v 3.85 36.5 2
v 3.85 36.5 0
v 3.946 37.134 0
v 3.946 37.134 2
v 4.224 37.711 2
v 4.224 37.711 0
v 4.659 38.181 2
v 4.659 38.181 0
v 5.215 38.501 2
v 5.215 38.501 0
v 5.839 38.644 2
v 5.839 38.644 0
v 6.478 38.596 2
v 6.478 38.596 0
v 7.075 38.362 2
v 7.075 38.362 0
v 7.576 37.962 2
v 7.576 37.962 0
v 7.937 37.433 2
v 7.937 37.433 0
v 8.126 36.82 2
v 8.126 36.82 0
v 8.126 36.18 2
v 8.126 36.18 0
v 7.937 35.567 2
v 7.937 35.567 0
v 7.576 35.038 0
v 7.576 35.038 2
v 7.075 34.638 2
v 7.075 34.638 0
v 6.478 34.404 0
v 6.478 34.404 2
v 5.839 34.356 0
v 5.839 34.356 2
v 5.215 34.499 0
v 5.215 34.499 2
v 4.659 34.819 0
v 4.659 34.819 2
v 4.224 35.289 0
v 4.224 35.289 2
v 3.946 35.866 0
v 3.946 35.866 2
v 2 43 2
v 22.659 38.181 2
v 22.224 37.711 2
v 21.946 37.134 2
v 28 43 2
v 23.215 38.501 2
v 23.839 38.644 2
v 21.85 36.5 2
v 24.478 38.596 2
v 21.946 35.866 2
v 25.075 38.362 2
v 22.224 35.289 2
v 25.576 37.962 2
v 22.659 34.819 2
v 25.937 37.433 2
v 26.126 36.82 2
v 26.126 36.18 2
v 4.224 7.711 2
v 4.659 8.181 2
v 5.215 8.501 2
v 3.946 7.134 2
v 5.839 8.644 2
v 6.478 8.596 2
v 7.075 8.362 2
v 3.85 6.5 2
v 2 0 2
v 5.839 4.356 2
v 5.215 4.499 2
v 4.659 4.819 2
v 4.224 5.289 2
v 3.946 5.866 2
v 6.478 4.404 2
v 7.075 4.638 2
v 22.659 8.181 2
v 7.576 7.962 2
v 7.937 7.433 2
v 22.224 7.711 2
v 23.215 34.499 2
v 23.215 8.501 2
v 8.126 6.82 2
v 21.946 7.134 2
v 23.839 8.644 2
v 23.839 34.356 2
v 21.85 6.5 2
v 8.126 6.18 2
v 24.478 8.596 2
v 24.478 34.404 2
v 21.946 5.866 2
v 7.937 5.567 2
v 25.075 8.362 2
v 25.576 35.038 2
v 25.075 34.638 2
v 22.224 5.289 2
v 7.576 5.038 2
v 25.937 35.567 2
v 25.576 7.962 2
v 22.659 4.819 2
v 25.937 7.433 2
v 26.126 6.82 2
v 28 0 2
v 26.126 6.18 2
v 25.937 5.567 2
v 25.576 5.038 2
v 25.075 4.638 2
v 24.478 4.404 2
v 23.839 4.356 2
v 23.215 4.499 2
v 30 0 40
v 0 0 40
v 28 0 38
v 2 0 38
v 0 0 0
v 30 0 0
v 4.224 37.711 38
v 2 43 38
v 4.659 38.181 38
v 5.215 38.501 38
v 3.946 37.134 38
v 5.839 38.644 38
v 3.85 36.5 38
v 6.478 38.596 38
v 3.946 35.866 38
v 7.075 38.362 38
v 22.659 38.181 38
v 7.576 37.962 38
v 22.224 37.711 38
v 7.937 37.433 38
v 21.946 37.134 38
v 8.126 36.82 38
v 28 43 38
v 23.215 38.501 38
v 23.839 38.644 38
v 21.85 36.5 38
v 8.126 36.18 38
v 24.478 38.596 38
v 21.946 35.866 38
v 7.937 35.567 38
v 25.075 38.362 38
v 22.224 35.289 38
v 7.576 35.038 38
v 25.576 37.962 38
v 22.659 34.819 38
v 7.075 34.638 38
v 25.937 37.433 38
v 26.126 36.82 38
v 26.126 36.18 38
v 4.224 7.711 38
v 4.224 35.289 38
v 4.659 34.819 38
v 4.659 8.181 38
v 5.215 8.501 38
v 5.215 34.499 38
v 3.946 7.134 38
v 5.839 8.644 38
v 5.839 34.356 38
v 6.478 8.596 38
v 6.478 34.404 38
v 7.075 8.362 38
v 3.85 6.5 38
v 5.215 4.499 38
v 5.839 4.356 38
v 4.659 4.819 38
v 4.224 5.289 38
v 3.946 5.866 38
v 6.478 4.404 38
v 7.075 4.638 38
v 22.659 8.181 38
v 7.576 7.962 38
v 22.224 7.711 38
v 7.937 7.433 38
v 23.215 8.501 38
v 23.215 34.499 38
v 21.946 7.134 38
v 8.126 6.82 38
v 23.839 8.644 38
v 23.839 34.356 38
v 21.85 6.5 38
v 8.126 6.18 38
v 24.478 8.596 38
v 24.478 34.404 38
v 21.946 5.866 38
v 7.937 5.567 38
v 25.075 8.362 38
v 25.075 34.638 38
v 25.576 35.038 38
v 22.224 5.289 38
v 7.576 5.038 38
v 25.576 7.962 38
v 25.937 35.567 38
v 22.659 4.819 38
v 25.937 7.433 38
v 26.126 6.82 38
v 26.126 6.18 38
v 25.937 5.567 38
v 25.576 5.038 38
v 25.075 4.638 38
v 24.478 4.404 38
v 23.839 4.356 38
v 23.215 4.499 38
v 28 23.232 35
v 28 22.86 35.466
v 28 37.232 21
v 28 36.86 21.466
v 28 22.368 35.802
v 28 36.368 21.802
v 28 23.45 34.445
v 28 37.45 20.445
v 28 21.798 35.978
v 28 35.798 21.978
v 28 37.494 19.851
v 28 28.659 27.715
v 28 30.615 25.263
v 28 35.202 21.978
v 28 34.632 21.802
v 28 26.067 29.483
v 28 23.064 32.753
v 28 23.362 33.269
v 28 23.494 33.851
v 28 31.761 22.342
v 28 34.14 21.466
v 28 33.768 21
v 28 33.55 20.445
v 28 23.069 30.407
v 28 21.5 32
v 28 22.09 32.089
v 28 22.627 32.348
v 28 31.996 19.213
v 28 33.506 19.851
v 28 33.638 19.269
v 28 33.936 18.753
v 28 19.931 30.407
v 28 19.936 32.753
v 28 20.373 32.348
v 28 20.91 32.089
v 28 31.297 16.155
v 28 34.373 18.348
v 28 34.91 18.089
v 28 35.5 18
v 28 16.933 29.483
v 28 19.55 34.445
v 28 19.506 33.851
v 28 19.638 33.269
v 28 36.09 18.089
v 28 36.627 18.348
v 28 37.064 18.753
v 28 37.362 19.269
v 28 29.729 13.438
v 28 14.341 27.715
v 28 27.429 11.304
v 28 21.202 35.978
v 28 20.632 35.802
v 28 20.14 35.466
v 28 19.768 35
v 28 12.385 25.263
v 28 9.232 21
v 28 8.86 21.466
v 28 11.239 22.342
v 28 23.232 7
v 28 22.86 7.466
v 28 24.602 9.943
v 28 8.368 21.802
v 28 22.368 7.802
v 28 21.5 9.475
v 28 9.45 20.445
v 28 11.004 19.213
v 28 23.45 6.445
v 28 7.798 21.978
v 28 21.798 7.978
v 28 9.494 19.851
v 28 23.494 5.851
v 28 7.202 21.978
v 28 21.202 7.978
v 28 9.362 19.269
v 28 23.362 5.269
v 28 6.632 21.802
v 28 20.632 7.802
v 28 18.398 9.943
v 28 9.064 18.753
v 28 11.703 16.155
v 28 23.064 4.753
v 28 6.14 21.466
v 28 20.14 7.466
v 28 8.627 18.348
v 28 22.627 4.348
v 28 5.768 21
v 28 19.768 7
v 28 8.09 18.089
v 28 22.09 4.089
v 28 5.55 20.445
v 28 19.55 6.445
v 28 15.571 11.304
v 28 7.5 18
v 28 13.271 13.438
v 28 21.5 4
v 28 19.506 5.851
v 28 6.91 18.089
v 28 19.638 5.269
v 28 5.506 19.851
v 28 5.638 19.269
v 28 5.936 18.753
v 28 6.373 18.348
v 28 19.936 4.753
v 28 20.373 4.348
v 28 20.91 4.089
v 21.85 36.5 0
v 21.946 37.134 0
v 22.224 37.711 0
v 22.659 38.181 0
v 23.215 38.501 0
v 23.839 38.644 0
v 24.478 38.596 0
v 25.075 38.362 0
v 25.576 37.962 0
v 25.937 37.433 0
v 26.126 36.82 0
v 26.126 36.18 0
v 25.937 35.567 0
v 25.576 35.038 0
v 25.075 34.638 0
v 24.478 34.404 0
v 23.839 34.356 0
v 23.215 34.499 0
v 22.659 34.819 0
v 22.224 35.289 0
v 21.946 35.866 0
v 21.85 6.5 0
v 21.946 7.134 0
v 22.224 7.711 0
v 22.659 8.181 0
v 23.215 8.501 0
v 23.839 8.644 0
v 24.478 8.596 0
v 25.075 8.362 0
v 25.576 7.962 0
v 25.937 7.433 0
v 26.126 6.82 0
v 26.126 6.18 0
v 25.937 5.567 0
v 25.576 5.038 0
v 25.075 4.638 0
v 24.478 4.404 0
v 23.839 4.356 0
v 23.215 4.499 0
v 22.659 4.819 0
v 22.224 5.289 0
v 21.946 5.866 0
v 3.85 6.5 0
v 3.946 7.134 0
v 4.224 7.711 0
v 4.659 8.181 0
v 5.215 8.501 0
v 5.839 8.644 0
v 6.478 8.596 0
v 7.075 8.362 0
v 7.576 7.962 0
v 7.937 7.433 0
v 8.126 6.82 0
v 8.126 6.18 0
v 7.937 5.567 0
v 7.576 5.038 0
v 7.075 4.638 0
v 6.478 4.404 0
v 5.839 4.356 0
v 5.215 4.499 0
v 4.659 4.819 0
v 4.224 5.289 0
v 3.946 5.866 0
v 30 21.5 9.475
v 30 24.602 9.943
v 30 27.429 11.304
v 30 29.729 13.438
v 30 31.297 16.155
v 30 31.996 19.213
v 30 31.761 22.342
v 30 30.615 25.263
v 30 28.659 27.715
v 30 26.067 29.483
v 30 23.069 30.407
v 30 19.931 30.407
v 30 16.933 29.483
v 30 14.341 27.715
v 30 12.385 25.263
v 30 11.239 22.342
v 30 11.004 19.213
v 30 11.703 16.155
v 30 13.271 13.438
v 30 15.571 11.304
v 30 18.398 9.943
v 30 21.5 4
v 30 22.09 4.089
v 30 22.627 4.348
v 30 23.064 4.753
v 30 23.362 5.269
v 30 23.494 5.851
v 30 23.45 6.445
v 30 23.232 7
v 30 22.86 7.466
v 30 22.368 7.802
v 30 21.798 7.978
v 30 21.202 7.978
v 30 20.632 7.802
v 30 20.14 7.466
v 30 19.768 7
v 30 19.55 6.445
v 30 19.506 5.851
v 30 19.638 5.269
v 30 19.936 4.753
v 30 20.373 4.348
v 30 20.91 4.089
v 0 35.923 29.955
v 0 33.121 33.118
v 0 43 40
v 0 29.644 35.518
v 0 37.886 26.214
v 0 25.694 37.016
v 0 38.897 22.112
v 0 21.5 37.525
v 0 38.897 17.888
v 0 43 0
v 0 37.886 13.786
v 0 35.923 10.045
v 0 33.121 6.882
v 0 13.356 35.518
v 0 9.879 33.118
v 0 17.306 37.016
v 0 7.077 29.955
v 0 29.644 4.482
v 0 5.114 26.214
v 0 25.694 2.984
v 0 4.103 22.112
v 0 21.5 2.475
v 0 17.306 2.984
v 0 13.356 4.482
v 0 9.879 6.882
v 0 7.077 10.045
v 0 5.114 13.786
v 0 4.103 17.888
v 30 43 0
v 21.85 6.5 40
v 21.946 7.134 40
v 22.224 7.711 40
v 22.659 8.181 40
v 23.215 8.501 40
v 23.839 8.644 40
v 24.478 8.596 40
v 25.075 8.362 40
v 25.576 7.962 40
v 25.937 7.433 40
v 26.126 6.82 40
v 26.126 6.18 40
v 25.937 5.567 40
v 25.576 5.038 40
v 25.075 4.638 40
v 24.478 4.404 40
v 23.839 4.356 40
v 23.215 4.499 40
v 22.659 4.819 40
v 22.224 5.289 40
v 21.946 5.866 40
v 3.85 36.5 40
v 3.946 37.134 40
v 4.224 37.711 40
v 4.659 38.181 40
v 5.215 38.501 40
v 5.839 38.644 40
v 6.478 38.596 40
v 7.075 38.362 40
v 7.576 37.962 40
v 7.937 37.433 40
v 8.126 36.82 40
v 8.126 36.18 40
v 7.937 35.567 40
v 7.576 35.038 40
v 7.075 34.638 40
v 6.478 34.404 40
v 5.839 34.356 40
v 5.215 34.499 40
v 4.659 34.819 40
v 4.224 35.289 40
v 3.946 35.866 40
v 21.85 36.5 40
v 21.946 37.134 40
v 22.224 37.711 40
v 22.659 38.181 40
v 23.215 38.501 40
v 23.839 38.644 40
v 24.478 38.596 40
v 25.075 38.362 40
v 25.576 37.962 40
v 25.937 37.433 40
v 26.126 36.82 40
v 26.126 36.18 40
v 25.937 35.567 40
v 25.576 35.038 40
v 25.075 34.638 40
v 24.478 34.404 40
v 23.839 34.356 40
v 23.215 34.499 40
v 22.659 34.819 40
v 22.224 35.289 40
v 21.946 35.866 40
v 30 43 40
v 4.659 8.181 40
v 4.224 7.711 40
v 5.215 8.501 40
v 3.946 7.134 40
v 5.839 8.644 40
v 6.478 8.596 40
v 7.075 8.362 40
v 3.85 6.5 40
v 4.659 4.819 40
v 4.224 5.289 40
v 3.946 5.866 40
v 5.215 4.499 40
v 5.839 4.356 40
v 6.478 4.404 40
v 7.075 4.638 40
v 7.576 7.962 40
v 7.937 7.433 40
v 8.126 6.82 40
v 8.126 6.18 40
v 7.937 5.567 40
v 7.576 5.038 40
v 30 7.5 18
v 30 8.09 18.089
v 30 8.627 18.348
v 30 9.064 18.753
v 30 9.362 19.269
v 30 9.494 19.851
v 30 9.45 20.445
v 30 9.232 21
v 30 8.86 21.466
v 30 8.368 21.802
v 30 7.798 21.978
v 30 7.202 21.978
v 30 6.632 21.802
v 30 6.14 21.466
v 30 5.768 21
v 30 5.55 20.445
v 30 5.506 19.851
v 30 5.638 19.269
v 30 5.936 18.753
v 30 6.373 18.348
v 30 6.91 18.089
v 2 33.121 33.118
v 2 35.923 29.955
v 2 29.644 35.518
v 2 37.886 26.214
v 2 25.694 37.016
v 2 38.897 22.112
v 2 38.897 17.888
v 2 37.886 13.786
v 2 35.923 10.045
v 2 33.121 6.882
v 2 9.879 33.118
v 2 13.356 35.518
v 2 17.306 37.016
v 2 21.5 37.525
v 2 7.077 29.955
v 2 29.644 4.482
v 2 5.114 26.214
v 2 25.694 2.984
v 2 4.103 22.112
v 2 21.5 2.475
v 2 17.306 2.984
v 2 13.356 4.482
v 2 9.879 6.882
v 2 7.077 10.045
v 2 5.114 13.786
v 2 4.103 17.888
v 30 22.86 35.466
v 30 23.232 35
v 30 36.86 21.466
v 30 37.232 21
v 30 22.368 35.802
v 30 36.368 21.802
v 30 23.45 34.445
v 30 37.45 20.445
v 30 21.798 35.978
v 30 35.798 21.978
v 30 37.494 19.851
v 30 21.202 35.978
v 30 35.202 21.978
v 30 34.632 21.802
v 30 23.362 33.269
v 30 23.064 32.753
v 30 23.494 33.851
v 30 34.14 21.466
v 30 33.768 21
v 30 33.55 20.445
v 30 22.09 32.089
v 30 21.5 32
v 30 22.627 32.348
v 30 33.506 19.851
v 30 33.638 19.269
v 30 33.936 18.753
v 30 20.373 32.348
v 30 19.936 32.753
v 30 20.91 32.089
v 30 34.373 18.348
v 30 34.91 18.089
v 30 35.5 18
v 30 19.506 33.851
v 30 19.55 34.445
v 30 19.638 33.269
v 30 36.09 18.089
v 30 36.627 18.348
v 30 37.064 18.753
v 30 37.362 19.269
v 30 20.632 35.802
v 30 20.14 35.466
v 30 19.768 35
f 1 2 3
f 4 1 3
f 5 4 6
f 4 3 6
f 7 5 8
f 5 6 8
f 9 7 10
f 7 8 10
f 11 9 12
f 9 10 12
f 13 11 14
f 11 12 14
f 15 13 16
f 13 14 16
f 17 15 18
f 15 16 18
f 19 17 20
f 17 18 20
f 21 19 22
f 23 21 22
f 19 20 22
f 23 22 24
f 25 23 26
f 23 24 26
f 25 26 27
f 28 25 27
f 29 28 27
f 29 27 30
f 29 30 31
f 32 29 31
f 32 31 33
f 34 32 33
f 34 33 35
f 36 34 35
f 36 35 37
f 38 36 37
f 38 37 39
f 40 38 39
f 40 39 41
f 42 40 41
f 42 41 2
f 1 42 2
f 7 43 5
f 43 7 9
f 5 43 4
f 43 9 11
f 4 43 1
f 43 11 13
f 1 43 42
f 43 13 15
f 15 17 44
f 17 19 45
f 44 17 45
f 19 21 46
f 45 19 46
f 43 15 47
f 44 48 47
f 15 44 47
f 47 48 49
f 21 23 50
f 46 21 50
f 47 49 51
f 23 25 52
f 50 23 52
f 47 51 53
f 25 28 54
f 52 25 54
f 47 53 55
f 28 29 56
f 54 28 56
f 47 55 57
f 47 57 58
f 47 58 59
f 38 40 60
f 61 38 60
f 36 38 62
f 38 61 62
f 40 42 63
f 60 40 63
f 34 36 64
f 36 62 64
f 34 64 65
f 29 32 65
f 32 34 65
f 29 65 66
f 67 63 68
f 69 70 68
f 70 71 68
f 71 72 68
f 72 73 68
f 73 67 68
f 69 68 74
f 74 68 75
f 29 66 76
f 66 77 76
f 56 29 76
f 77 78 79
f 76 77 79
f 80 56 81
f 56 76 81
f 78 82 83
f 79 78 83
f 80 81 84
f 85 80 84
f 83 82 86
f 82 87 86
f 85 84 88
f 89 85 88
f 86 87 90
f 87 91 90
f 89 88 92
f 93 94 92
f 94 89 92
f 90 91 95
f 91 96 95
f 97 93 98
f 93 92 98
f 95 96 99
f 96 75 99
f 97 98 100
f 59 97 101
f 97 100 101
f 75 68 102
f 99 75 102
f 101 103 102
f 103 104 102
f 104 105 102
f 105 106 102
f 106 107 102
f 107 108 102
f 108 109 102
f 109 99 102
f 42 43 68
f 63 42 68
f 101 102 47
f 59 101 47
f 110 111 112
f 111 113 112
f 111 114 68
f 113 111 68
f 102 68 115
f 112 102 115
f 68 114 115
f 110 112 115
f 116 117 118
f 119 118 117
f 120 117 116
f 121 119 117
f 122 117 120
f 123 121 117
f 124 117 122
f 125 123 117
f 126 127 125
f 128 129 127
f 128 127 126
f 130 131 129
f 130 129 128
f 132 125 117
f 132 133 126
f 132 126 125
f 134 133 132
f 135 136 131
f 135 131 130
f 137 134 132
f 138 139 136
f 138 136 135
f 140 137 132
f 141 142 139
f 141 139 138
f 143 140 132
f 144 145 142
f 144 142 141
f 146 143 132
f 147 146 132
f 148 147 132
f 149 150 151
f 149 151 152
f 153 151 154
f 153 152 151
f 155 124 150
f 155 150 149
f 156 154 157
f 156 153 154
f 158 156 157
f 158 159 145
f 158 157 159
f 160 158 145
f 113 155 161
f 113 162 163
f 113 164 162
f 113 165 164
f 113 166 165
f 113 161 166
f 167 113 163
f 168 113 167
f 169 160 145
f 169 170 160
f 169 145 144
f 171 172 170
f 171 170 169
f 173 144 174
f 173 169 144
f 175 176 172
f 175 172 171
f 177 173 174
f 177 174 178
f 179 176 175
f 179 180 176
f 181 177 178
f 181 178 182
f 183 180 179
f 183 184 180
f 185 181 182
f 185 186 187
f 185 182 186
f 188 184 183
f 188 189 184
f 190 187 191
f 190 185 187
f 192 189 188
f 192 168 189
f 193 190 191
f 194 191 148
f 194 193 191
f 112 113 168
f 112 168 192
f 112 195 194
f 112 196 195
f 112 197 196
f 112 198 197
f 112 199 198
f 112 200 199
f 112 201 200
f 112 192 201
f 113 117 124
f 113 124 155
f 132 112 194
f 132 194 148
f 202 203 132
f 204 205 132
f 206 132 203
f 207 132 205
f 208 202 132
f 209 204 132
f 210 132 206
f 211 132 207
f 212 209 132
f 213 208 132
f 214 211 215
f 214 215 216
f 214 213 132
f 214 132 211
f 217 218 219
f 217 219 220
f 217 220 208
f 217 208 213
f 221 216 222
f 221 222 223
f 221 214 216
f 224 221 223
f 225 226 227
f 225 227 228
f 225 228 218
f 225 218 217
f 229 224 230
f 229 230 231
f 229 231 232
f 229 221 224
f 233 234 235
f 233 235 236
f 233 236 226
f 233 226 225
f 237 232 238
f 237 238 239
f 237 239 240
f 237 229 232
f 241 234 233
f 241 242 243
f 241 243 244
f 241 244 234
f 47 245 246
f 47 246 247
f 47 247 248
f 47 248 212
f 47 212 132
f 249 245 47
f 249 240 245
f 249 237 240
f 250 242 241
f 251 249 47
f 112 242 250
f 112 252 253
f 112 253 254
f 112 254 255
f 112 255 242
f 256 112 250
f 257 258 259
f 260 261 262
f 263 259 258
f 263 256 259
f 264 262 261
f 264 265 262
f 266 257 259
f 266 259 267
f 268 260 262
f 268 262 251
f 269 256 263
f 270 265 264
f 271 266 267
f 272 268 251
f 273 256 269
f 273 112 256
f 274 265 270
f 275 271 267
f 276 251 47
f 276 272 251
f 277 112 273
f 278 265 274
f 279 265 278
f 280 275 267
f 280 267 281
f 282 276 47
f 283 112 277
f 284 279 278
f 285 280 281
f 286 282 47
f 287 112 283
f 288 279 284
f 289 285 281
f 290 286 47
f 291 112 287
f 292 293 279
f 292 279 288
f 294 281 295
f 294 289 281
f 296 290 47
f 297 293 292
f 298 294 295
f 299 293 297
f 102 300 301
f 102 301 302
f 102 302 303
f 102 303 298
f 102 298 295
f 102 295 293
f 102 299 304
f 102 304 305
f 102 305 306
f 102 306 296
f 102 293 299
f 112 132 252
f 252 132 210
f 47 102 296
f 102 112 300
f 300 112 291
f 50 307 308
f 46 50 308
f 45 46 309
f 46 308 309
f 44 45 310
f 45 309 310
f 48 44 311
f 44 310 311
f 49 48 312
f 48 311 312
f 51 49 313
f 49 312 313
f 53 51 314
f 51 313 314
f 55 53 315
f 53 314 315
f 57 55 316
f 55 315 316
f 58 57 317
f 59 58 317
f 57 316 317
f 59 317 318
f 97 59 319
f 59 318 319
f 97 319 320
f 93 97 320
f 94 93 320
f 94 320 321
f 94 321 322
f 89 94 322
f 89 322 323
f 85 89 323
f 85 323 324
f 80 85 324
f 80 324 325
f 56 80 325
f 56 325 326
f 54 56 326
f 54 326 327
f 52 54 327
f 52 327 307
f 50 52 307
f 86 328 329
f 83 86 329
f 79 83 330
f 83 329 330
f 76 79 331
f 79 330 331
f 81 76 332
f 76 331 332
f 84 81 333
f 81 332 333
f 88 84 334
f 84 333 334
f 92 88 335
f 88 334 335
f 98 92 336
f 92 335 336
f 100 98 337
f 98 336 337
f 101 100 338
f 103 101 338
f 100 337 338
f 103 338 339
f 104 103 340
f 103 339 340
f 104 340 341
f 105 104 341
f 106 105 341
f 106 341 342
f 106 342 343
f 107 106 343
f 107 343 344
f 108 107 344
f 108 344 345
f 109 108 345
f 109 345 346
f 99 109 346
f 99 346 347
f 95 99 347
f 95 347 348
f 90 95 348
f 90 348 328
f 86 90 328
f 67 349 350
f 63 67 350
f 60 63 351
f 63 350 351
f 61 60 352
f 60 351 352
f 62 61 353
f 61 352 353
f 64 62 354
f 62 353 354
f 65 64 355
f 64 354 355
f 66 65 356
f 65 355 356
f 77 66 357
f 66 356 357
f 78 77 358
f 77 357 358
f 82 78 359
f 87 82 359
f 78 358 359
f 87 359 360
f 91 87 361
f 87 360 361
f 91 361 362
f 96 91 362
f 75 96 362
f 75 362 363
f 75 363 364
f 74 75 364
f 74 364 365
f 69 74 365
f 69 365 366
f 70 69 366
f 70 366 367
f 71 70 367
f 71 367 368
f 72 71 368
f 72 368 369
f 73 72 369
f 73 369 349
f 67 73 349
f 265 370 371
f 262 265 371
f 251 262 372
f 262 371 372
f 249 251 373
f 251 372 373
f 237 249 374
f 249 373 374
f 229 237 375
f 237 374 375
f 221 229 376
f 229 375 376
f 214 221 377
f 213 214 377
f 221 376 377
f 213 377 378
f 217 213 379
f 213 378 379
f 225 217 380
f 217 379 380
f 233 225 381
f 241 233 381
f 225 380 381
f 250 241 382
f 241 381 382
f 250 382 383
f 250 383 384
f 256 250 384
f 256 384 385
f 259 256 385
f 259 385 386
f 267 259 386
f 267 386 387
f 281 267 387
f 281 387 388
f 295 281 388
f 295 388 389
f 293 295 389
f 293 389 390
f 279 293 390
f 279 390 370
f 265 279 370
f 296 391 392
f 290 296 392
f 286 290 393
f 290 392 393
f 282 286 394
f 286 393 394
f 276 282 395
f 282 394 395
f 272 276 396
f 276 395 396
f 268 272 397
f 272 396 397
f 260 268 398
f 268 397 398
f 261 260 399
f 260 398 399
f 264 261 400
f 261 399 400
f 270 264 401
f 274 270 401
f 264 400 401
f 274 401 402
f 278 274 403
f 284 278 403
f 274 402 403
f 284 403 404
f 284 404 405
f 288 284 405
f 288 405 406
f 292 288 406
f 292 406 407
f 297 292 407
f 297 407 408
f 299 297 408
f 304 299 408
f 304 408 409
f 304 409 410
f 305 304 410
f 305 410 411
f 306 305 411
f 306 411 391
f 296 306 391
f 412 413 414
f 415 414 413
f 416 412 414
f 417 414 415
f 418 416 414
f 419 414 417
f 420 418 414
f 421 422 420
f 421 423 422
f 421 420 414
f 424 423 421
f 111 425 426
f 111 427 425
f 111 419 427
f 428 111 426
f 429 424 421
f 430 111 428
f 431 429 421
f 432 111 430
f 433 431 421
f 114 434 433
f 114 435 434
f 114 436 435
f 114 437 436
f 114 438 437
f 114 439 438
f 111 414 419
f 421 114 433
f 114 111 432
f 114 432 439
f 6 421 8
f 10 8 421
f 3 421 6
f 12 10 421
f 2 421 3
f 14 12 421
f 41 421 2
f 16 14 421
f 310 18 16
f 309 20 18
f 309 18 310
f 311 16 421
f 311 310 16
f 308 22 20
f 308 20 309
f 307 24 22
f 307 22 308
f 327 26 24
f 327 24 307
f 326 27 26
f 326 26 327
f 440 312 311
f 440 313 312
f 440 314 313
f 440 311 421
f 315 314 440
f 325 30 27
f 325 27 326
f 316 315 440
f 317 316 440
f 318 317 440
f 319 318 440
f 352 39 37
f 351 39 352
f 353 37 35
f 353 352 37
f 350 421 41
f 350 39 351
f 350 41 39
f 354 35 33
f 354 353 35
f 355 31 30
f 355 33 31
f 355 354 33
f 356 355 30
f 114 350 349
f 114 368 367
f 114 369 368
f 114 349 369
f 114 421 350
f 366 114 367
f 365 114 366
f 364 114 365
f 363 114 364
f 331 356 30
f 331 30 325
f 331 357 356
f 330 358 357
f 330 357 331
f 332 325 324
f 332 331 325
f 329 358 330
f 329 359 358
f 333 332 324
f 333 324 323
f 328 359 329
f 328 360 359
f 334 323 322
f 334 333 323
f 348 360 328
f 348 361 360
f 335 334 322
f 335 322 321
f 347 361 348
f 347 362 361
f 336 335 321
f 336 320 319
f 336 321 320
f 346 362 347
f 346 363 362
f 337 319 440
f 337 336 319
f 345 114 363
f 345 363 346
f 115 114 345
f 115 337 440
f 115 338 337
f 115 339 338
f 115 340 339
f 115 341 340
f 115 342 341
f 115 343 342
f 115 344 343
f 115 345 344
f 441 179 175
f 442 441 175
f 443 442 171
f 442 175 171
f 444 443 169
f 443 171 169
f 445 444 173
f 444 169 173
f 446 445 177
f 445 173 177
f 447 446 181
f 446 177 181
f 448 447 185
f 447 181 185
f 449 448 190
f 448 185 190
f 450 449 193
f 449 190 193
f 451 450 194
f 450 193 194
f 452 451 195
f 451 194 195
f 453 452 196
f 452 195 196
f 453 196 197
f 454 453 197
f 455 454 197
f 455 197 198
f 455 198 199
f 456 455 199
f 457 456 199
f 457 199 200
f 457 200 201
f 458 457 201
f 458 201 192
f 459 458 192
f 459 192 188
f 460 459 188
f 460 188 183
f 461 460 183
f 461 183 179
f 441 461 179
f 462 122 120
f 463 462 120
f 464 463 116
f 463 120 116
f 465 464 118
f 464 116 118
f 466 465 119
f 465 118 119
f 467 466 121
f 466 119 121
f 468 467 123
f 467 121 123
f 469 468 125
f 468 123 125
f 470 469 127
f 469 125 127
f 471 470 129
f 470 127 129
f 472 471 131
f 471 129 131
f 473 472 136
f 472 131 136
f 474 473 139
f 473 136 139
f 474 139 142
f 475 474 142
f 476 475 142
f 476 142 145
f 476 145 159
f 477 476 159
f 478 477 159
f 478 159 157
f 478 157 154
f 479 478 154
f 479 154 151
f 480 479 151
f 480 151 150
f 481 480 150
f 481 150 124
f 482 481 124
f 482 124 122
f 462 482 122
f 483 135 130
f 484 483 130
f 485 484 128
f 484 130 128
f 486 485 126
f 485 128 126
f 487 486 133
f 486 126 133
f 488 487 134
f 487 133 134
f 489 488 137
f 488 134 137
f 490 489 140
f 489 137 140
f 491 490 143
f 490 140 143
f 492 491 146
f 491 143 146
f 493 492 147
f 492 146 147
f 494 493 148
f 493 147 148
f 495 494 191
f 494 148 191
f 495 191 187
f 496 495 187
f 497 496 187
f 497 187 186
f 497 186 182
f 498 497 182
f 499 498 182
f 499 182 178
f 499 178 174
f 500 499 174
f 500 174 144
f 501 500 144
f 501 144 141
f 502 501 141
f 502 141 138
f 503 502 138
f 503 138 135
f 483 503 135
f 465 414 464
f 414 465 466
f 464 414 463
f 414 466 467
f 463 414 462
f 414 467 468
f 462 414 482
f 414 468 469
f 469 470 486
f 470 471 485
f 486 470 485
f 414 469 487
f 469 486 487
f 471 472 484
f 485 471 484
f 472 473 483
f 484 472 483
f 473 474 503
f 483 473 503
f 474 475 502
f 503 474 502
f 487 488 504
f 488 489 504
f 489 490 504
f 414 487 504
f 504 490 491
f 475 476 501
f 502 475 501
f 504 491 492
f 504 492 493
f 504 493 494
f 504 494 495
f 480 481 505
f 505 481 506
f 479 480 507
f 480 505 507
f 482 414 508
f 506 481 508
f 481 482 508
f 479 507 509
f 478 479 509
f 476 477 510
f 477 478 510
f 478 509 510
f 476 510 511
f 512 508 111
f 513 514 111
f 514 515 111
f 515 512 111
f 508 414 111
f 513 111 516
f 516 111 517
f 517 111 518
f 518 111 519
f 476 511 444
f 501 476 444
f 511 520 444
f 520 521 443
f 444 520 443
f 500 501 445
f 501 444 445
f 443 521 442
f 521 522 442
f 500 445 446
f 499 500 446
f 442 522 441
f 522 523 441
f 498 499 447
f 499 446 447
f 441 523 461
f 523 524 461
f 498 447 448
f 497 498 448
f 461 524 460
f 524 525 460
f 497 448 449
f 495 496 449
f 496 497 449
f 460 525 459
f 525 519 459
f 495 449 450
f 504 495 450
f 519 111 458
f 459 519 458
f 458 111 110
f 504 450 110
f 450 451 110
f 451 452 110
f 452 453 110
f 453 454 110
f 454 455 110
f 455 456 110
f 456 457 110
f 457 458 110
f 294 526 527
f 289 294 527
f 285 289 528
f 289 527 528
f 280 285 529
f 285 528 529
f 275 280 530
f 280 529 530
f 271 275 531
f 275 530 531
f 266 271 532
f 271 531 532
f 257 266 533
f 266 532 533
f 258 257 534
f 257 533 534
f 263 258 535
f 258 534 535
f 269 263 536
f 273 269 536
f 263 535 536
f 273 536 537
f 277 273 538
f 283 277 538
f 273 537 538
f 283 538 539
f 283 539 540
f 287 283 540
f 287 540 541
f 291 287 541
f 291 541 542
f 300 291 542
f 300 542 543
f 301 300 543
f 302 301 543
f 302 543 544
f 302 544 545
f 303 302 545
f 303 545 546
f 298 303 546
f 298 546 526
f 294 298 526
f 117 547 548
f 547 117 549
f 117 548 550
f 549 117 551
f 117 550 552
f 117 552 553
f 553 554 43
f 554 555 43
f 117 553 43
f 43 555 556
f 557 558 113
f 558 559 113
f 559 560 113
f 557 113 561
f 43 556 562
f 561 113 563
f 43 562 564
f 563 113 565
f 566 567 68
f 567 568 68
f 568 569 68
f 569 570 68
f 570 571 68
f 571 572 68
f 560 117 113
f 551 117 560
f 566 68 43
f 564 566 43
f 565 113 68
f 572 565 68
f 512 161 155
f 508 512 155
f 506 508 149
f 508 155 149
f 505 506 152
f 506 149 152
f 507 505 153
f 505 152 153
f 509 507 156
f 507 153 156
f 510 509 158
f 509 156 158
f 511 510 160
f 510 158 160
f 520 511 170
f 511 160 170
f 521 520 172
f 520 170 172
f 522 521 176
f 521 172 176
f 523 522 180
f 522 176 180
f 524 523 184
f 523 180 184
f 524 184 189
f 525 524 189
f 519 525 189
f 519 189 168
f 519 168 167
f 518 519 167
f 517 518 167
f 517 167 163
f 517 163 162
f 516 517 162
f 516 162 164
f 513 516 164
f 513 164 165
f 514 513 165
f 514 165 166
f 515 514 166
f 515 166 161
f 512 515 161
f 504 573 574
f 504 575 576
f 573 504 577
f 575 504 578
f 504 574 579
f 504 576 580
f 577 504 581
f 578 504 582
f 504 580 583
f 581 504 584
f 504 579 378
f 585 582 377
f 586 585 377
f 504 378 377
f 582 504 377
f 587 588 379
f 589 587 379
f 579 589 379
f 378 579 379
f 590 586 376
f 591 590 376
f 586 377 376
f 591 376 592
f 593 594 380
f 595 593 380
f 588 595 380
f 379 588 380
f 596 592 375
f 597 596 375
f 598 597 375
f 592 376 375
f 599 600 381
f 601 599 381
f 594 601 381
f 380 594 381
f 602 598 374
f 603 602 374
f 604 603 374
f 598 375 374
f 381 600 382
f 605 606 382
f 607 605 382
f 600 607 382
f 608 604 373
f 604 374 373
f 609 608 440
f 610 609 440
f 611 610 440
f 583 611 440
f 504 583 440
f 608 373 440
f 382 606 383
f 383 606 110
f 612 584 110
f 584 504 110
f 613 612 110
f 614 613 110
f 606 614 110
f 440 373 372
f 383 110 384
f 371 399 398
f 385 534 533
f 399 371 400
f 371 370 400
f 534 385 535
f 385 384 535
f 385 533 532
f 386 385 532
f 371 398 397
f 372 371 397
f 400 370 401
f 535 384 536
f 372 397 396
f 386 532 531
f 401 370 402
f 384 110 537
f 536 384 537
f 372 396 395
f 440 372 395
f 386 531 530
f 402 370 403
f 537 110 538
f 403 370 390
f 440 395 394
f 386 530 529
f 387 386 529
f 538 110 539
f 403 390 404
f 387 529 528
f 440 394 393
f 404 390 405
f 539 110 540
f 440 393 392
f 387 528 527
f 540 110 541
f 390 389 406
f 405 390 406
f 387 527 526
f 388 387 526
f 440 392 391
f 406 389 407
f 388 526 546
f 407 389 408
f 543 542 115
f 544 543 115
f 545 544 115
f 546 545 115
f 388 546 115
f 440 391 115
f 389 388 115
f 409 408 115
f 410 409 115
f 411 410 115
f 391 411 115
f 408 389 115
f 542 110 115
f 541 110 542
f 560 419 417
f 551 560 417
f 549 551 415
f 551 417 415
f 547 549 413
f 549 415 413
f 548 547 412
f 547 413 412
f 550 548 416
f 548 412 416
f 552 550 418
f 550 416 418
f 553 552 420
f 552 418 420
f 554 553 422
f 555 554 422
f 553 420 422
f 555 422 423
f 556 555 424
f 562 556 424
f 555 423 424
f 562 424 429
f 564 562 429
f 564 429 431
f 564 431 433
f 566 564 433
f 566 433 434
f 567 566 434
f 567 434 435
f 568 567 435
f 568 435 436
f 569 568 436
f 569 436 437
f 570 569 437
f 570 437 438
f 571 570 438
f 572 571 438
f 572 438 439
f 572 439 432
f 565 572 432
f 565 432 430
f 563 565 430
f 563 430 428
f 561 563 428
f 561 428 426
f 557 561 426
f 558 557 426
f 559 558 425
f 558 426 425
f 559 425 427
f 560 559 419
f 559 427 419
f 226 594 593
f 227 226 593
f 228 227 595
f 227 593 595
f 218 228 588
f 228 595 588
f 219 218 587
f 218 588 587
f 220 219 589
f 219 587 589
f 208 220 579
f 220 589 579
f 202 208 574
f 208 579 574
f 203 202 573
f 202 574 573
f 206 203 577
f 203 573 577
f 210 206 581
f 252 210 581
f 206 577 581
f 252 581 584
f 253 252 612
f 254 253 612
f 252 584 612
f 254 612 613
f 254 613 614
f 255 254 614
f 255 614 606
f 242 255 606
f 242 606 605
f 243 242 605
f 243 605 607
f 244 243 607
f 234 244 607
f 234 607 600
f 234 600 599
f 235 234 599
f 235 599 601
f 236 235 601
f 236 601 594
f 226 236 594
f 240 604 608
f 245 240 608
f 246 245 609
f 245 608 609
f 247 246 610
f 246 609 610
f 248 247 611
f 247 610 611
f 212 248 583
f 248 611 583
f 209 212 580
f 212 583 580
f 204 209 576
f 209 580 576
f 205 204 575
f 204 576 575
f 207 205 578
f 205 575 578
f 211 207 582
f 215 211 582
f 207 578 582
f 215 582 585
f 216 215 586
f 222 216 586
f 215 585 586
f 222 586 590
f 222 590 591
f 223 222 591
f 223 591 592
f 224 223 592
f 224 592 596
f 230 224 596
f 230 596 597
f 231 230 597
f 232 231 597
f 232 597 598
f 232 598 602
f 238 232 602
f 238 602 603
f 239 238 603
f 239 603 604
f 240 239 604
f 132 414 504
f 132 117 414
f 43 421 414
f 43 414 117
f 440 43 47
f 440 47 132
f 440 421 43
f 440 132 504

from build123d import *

# Parameters (mm, degrees)
SKETCH_1_W          = 30
SKETCH_1_H          = 40
SKETCH_1_W_2        = 26
SKETCH_1_H_2        = 36
EXTRUDE_1_DEPTH     = 43
SKETCH_2_R          = 2.15
CUT_EXTRUDE_1_DEPTH = 66.946948375
CUT_EXTRUDE_2_REACH = 67.947
SKETCH_3_R          = 17.525
CUT_EXTRUDE_3_REACH = 67.947
SKETCH_4_R          = 10.525
SKETCH_4_R_2        = 2


with BuildPart() as part:
    # 草图1 → 凸台-拉伸1 (new body)
    with BuildSketch(Plane(origin=(0, 0, 0), x_dir=(1, 0, 0), z_dir=(0, 1, 0))):
        with Locations((15, -20)):
            Rectangle(SKETCH_1_W, SKETCH_1_H)
        with Locations((15, -20)):
            Rectangle(SKETCH_1_W_2, SKETCH_1_H_2, mode=Mode.SUBTRACT)
    extrude(amount=EXTRUDE_1_DEPTH)

    # 草图2 → 切除-拉伸1 (cut, through all)
    with BuildSketch(Plane(origin=(0, 0, 0), x_dir=(-1, 0, 0), z_dir=(0, 0, -1))):
        with Locations((-6, 6.5)):
            Circle(SKETCH_2_R)
        with Locations((-24, 6.5)):
            Circle(SKETCH_2_R)
        with Locations((-24, 36.5)):
            Circle(SKETCH_2_R)
        with Locations((-6, 36.5)):
            Circle(SKETCH_2_R)
    extrude(amount=-CUT_EXTRUDE_1_DEPTH, mode=Mode.SUBTRACT)

    # 草图3 → 切除-拉伸2 (cut, up to next)
    with BuildSketch(Plane.ZY, mode=Mode.PRIVATE) as cut_extrude_2_sk1:
        with Locations((20, 21.5)):
            Circle(SKETCH_3_R)
    cut_extrude_2_tool1 = extrude(cut_extrude_2_sk1.sketch, amount=-CUT_EXTRUDE_2_REACH, mode=Mode.PRIVATE) & part.part
    add(cut_extrude_2_tool1.solids().sort_by_distance((0, 21.5, 20))[0], mode=Mode.SUBTRACT)

    # 草图4 → 切除-拉伸3 (cut, up to next)
    with BuildSketch(Plane(origin=(30, 0, 0), x_dir=(0, 0, -1), z_dir=(1, 0, 0)), mode=Mode.PRIVATE) as cut_extrude_3_sk1:
        with Locations((-20, 21.5)):
            Circle(SKETCH_4_R)
    cut_extrude_3_tool1 = extrude(cut_extrude_3_sk1.sketch, amount=-CUT_EXTRUDE_3_REACH, mode=Mode.PRIVATE) & part.part
    # 草图4 → 切除-拉伸3 (cut, up to next)
    with BuildSketch(Plane(origin=(30, 0, 0), x_dir=(0, 0, -1), z_dir=(1, 0, 0)), mode=Mode.PRIVATE) as cut_extrude_3_sk2:
        with Locations((-6, 21.5)):
            Circle(SKETCH_4_R_2)
    cut_extrude_3_tool2 = extrude(cut_extrude_3_sk2.sketch, amount=-CUT_EXTRUDE_3_REACH, mode=Mode.PRIVATE) & part.part
    # 草图4 → 切除-拉伸3 (cut, up to next)
    with BuildSketch(Plane(origin=(30, 0, 0), x_dir=(0, 0, -1), z_dir=(1, 0, 0)), mode=Mode.PRIVATE) as cut_extrude_3_sk3:
        with Locations((-20, 7.5)):
            Circle(SKETCH_4_R_2)
    cut_extrude_3_tool3 = extrude(cut_extrude_3_sk3.sketch, amount=-CUT_EXTRUDE_3_REACH, mode=Mode.PRIVATE) & part.part
    # 草图4 → 切除-拉伸3 (cut, up to next)
    with BuildSketch(Plane(origin=(30, 0, 0), x_dir=(0, 0, -1), z_dir=(1, 0, 0)), mode=Mode.PRIVATE) as cut_extrude_3_sk4:
        with Locations((-34, 21.5)):
            Circle(SKETCH_4_R_2)
    cut_extrude_3_tool4 = extrude(cut_extrude_3_sk4.sketch, amount=-CUT_EXTRUDE_3_REACH, mode=Mode.PRIVATE) & part.part
    # 草图4 → 切除-拉伸3 (cut, up to next)
    with BuildSketch(Plane(origin=(30, 0, 0), x_dir=(0, 0, -1), z_dir=(1, 0, 0)), mode=Mode.PRIVATE) as cut_extrude_3_sk5:
        with Locations((-20, 35.5)):
            Circle(SKETCH_4_R_2)
    cut_extrude_3_tool5 = extrude(cut_extrude_3_sk5.sketch, amount=-CUT_EXTRUDE_3_REACH, mode=Mode.PRIVATE) & part.part
    add(cut_extrude_3_tool1.solids().sort_by_distance((30, 21.5, 20))[0], mode=Mode.SUBTRACT)
    add(cut_extrude_3_tool2.solids().sort_by_distance((30, 21.5, 6))[0], mode=Mode.SUBTRACT)
    add(cut_extrude_3_tool3.solids().sort_by_distance((30, 7.5, 20))[0], mode=Mode.SUBTRACT)
    add(cut_extrude_3_tool4.solids().sort_by_distance((30, 21.5, 34))[0], mode=Mode.SUBTRACT)
    add(cut_extrude_3_tool5.solids().sort_by_distance((30, 35.5, 20))[0], mode=Mode.SUBTRACT)


solid = part.part
